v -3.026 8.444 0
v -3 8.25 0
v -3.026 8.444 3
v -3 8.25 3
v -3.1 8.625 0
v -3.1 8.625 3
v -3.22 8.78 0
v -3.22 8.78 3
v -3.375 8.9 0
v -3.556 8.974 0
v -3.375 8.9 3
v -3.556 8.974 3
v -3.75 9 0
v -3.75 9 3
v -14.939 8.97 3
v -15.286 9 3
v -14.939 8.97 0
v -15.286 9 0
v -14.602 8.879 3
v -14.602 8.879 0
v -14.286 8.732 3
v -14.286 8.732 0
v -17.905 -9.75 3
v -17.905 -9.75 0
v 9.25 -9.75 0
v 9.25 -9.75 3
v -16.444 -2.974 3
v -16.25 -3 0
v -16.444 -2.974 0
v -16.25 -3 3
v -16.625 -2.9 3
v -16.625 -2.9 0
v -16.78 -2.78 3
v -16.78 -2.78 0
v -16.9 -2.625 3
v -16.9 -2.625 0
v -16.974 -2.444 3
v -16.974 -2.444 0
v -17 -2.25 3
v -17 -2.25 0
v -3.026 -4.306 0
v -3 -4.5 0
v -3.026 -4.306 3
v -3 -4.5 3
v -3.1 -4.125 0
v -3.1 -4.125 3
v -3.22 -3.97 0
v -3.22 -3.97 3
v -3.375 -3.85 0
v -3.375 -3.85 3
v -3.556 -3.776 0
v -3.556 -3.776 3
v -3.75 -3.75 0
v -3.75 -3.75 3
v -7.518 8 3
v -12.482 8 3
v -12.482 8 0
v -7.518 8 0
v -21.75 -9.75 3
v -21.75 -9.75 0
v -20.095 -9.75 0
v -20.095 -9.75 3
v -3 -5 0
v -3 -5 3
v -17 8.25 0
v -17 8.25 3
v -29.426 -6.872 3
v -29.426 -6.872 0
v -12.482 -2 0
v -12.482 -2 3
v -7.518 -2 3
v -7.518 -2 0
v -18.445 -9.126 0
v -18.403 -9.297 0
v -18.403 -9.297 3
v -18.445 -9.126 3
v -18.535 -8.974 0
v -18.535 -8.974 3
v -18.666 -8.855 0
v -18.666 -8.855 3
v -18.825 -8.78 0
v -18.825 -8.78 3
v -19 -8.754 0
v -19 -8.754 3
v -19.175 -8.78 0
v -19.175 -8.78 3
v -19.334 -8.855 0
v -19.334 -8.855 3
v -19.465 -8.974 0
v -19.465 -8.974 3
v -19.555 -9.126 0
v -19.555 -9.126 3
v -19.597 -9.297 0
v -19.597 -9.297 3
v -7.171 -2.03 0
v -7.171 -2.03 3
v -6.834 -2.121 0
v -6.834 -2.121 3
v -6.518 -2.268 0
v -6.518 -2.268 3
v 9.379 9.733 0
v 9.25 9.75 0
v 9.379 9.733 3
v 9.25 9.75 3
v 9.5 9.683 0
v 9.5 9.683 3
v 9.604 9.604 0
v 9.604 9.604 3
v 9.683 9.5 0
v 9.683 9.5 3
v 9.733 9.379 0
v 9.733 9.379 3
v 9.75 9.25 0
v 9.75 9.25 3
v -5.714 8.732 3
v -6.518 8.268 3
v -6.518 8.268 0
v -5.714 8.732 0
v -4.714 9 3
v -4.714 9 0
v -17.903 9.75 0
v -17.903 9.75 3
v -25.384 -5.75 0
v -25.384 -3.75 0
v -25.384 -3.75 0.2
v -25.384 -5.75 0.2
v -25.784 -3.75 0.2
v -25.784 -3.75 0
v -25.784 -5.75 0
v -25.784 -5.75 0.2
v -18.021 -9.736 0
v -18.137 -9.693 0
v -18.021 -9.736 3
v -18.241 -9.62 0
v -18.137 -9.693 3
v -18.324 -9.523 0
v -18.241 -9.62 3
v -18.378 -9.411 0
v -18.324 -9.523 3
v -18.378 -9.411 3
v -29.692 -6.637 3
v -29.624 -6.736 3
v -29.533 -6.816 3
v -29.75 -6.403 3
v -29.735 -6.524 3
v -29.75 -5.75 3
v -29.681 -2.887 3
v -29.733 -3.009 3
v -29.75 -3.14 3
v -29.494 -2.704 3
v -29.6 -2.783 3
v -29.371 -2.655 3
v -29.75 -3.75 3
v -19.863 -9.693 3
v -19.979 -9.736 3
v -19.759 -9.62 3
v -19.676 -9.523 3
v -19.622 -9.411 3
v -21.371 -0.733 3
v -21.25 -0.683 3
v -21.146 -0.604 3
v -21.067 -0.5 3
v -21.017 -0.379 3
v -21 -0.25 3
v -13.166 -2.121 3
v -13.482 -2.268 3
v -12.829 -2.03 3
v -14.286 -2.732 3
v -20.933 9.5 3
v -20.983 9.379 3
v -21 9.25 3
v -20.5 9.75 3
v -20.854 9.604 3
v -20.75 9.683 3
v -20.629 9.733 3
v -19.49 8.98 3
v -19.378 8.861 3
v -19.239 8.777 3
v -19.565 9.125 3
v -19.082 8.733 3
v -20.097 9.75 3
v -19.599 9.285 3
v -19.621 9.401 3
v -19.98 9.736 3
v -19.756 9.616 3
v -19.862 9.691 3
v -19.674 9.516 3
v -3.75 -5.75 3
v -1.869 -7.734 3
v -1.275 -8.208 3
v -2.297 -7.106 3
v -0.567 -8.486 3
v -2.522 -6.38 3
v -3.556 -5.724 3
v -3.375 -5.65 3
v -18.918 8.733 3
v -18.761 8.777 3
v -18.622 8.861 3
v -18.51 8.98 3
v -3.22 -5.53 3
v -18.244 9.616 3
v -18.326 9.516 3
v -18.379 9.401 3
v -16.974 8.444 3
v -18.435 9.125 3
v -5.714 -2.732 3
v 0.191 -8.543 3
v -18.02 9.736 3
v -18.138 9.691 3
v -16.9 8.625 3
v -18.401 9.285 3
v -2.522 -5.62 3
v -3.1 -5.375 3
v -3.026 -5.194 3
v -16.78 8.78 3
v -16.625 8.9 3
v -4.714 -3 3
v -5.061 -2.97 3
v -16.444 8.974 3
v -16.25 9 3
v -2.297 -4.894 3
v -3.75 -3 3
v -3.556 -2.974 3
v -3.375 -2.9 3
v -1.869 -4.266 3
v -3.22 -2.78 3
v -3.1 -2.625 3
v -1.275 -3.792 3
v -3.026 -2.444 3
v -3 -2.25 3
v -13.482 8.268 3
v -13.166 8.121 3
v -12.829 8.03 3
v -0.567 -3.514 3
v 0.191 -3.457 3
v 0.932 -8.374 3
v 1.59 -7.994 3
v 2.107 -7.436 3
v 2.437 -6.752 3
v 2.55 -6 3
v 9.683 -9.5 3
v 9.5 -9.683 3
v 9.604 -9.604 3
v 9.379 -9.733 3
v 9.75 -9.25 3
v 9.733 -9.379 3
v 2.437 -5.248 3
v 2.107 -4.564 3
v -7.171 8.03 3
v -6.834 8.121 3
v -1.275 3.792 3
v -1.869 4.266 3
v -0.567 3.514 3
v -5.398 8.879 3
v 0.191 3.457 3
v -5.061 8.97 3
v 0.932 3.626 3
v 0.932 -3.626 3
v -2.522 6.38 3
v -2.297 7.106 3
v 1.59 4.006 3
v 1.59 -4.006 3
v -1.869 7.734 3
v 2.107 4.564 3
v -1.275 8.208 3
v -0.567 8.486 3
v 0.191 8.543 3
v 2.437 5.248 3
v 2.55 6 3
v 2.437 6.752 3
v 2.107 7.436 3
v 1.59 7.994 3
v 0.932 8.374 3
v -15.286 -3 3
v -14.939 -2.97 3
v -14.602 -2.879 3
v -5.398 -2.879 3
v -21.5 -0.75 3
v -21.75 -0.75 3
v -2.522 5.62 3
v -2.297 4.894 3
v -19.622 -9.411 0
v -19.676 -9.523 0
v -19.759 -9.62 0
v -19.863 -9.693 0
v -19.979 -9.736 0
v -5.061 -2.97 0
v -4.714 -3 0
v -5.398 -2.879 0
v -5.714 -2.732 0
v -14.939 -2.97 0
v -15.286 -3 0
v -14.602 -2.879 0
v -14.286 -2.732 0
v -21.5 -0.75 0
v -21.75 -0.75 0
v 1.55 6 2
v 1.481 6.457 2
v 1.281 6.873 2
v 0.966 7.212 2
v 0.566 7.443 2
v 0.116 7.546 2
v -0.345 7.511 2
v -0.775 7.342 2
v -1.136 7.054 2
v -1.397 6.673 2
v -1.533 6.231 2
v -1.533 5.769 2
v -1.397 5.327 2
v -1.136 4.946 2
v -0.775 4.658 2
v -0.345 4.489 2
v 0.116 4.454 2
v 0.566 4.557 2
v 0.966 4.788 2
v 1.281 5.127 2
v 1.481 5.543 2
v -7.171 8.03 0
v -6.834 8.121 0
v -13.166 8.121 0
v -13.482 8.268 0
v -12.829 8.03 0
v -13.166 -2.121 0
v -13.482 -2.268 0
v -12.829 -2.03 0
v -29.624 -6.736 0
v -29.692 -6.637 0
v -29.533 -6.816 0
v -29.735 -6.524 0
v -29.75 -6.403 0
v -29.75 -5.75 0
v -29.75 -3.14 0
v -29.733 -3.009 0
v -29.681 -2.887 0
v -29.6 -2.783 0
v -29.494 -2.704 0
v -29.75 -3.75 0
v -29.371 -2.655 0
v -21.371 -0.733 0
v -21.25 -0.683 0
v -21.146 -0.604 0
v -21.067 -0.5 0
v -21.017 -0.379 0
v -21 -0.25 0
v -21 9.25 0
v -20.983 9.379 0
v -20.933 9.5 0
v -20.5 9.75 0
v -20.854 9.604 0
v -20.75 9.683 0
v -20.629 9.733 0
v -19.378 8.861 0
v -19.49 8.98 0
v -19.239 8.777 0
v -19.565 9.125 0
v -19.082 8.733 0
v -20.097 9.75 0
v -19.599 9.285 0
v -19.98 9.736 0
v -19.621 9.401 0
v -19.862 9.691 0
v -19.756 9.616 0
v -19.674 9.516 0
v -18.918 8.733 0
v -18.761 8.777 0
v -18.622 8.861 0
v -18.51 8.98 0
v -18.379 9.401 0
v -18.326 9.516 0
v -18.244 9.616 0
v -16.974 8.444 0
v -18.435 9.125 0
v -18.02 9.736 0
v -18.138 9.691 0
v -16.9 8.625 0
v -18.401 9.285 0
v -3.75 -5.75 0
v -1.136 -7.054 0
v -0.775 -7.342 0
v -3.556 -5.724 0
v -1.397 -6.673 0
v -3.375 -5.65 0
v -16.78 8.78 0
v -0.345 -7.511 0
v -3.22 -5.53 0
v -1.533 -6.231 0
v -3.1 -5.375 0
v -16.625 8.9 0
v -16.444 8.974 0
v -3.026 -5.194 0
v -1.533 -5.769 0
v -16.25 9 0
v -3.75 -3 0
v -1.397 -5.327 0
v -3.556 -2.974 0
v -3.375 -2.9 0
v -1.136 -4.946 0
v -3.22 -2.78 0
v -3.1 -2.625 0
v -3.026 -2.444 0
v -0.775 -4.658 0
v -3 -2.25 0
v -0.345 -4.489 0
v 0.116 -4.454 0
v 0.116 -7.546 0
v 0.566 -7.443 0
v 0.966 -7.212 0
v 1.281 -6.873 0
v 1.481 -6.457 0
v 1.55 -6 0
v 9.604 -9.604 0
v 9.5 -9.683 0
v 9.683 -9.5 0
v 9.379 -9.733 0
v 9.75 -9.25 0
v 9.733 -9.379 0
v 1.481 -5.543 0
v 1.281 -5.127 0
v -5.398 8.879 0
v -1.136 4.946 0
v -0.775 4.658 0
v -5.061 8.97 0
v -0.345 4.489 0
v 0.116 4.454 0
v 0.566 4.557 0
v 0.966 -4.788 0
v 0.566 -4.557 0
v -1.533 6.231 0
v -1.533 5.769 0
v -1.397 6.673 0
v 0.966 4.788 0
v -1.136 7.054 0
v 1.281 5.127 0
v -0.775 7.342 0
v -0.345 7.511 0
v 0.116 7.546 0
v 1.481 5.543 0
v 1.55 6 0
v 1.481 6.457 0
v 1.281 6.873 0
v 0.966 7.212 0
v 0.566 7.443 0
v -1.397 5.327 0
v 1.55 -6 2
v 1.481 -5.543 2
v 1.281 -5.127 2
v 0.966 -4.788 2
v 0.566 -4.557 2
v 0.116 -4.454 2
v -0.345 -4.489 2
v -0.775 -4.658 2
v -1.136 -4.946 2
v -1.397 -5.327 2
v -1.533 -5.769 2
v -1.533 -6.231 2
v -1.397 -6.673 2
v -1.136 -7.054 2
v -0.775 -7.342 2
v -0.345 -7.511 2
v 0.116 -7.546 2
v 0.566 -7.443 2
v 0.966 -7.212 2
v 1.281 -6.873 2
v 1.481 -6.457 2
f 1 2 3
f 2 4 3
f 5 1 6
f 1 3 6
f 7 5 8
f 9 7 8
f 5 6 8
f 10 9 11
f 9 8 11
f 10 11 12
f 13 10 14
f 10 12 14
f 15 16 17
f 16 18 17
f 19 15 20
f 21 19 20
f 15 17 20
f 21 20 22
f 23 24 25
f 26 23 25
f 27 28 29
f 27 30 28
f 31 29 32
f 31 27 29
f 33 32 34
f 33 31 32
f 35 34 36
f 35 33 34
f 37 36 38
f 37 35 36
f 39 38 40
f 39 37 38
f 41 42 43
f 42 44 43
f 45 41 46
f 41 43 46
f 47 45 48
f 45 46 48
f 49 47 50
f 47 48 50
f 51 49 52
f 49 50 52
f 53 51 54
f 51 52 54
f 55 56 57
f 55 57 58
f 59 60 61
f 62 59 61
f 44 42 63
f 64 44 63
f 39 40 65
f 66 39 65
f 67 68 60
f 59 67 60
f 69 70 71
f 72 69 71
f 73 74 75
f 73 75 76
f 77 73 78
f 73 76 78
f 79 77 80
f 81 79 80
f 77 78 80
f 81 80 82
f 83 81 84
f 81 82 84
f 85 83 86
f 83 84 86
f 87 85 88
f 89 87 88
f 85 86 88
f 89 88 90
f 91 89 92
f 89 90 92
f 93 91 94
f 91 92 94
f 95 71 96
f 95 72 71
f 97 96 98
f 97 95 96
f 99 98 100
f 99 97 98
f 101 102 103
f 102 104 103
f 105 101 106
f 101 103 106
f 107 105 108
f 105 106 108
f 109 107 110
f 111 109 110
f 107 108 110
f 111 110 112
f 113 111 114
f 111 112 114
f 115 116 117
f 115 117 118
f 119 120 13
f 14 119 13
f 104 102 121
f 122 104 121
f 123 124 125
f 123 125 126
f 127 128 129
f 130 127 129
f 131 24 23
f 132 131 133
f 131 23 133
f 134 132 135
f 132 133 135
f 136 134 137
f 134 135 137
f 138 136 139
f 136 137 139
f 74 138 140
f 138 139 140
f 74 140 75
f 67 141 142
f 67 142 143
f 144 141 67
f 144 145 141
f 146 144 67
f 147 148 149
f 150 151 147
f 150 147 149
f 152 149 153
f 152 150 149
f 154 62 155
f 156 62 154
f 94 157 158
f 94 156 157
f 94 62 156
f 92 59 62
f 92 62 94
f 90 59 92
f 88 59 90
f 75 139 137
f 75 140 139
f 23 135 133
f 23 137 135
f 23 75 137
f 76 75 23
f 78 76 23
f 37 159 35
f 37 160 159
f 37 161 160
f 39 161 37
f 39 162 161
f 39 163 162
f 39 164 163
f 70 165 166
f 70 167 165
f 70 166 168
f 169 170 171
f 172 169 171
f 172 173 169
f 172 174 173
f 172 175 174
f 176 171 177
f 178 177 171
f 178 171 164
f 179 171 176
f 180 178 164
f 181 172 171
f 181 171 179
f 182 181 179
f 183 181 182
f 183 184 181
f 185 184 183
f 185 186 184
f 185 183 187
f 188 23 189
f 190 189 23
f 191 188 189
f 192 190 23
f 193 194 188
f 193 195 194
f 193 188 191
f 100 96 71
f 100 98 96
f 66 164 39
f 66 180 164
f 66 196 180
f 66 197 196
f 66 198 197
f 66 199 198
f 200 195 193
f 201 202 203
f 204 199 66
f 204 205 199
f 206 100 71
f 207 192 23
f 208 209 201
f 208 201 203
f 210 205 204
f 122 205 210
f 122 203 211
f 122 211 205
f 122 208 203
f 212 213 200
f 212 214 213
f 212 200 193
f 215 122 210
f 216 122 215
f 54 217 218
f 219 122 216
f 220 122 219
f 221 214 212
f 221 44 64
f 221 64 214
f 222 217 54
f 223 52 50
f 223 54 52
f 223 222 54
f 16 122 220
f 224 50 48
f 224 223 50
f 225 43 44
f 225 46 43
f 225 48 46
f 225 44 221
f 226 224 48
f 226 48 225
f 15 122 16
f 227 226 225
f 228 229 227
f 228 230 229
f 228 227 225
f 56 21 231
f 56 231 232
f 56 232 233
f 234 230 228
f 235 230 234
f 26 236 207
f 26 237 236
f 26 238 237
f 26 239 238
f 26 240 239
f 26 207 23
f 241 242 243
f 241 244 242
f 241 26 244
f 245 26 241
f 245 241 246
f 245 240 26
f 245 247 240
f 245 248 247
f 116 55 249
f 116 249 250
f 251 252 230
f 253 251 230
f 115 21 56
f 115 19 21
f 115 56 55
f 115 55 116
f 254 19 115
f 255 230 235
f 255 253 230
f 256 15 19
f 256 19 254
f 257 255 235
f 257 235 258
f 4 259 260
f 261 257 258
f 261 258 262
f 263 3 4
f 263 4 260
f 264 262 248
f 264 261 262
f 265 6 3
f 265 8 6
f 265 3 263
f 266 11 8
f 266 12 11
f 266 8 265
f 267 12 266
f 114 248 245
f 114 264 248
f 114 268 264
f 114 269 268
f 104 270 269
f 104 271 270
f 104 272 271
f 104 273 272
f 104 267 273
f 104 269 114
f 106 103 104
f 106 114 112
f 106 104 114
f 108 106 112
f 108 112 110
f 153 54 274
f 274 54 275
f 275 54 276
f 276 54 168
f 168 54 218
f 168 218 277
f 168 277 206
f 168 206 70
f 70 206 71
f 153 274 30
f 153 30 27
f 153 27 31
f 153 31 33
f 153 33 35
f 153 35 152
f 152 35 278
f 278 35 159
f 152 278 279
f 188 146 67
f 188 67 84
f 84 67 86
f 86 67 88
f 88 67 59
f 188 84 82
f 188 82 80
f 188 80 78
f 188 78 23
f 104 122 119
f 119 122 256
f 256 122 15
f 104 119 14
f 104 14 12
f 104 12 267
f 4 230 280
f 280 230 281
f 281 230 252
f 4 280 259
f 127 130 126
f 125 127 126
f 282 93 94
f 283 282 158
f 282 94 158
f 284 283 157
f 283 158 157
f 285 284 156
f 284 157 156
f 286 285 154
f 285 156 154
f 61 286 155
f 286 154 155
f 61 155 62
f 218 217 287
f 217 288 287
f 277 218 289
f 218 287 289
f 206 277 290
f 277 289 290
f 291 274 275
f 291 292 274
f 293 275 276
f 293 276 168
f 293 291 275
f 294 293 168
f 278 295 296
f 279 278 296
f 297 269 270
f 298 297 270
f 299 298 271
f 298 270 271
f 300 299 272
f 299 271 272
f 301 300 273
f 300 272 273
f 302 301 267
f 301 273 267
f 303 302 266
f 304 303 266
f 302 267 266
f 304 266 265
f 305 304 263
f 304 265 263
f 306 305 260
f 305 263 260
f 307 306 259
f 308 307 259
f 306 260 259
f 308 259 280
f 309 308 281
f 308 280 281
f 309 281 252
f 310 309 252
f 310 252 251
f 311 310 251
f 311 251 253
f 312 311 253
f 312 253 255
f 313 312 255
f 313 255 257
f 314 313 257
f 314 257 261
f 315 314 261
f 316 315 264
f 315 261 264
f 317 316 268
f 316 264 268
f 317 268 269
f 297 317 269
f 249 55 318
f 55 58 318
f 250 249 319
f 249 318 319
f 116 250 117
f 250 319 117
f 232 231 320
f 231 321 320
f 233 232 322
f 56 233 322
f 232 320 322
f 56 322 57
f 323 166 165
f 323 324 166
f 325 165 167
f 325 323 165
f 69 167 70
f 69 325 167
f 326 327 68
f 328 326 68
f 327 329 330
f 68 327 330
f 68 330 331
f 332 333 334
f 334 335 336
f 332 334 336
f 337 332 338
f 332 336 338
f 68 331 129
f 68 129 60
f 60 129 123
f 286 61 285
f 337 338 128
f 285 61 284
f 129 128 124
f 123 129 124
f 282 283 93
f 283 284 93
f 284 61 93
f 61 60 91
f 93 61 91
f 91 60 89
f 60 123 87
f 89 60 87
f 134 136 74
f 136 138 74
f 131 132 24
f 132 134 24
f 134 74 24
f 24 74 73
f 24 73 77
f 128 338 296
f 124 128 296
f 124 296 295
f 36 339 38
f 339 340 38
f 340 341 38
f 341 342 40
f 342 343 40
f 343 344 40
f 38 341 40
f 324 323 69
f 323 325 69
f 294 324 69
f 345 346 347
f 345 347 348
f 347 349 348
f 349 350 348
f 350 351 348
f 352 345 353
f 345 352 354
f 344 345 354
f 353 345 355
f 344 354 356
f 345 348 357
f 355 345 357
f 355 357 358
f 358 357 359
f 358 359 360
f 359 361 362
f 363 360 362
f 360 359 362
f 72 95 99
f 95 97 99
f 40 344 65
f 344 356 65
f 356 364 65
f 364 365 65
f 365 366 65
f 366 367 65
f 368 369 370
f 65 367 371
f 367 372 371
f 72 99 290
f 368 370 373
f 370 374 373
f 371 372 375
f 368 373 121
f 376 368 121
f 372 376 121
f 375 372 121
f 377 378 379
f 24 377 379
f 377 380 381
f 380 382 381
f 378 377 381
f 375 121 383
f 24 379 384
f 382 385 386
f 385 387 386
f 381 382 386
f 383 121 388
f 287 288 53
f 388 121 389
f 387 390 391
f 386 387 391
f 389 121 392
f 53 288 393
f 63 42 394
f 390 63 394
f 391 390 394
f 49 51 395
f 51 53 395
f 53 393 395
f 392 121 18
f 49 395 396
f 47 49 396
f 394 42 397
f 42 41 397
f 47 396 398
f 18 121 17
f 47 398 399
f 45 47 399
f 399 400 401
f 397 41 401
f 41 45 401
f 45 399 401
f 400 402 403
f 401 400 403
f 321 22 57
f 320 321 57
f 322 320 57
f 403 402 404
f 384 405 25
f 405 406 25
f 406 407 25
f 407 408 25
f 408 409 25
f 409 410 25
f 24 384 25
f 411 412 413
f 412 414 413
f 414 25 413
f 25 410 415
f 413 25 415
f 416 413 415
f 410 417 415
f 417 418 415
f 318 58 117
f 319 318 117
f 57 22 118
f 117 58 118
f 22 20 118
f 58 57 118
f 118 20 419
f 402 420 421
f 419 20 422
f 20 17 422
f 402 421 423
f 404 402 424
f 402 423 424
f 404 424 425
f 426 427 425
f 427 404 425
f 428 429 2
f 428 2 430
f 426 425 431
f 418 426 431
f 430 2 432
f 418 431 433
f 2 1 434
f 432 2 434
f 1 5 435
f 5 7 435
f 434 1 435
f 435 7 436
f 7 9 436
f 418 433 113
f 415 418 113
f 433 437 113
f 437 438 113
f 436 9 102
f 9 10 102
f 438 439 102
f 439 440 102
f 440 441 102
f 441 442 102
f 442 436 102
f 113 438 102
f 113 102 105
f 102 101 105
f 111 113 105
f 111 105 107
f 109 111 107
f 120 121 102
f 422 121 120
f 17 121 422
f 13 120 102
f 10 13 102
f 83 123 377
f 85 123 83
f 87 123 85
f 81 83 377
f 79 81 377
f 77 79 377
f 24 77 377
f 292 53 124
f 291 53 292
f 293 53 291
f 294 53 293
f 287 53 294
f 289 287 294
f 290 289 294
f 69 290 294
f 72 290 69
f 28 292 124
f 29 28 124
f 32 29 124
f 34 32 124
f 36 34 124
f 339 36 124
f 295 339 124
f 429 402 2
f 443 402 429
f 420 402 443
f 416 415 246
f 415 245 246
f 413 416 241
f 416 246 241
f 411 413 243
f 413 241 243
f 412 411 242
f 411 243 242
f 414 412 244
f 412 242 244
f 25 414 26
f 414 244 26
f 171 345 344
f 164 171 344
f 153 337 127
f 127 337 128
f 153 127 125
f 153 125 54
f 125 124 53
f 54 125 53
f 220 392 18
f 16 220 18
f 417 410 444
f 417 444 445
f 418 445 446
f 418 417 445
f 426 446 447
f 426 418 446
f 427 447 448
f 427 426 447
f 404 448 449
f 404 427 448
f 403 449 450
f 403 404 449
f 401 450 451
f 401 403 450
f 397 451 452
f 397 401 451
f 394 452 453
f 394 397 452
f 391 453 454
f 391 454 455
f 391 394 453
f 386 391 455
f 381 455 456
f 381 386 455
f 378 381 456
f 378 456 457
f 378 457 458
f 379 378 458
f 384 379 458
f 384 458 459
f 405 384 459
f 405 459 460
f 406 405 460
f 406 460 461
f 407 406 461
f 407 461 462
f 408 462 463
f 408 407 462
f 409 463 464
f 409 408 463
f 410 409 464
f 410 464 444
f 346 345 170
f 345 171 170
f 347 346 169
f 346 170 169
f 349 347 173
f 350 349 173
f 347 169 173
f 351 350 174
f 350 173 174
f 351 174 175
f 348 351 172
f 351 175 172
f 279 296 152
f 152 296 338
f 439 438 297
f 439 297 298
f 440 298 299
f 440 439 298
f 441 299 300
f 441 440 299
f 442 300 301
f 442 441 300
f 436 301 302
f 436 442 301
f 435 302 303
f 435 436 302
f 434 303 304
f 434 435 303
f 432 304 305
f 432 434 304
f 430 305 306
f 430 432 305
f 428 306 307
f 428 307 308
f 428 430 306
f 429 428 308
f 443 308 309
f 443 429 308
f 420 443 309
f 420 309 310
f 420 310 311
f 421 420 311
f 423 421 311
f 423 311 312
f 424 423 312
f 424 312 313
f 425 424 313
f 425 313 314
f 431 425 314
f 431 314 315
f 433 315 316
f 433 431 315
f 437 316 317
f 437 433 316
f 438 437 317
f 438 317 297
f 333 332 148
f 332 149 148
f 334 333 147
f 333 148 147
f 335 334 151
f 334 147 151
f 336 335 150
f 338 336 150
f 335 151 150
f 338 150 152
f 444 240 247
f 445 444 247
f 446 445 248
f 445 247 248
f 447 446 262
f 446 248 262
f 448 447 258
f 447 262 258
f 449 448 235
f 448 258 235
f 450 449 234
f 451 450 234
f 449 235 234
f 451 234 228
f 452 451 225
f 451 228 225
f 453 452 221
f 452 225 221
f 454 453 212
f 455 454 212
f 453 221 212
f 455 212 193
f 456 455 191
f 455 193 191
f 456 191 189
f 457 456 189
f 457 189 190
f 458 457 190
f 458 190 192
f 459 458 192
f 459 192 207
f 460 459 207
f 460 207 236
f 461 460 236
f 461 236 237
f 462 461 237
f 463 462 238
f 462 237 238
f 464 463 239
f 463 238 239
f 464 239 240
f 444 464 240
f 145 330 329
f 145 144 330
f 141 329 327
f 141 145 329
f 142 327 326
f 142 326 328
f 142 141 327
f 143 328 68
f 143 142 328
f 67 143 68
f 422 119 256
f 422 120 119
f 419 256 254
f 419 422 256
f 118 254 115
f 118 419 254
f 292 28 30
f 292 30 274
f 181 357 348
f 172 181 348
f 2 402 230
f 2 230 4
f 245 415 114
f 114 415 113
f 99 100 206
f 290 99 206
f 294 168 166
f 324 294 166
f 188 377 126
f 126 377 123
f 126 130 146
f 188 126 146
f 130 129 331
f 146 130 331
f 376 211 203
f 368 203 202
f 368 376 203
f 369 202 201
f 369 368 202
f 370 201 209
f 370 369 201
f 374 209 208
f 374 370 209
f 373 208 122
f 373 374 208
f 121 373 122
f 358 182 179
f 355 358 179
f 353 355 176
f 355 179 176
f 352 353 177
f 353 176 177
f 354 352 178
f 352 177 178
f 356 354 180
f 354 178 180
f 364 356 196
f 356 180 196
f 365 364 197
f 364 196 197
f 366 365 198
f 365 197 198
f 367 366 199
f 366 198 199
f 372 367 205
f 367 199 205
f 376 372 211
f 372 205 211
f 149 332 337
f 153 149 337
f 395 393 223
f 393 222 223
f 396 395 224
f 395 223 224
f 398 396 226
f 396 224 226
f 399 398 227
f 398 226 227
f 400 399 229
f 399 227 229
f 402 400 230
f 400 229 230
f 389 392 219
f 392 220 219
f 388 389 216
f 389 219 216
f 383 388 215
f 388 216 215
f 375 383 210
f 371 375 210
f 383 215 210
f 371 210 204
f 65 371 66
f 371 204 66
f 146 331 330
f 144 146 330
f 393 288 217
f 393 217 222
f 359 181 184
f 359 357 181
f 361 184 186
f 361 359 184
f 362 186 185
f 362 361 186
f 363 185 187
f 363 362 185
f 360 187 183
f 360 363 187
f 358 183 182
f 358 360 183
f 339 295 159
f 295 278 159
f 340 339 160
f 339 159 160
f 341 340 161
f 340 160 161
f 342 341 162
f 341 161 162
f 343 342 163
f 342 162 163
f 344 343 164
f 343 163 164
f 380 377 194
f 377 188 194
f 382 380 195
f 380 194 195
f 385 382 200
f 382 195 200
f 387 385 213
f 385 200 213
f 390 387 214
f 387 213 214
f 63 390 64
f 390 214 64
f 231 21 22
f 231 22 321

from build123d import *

# Parameters (mm, degrees)
SKETCH_R     = 1.55
SKETCH_W     = 14
SKETCH_H     = 12
PAD_DEPTH    = 3
FILLET_R     = 0.75
POCKET_DEPTH = 5
FILLET001_R  = 0.5
CHAMFER_SIZE = 1
PAD001_DEPTH = 3
FILLET002_R  = 2
SKETCH004_W  = 0.400118
SKETCH004_H  = 2.725121
PAD002_DEPTH = 0.2


with BuildPart() as part:
    # Sketch → Pad (new body)
    with BuildSketch(Plane.XY):
        Polygon((-9.75, -9.75), (9.75, -9.75), (9.75, 9.75), (-9.75, 9.75), (-21, 9.75), (-21, -0.75), (-21.75, -0.75), (-29.75, -2.75), (-29.75, -3.75), (-3, -3.75), (-3, -5.75), (-29.75, -5.75), (-29.75, -6.75), (-21.75, -9.75), align=None)
        with Locations((0, 6)):
            Circle(SKETCH_R, mode=Mode.SUBTRACT)
        with Locations((0, -6)):
            Circle(SKETCH_R, mode=Mode.SUBTRACT)
        with Locations((-10, 3)):
            Rectangle(SKETCH_W, SKETCH_H, mode=Mode.SUBTRACT)
    extrude(amount=PAD_DEPTH)

    # Fillet
    fillet_edges = [part.edges().sort_by_distance(p)[0] for p in [
        (-3, -3, 1.5),
        (-3, 9, 1.5),
        (-17, 9, 1.5),
        (-17, -3, 1.5),
        (-3, -3.75, 1.5),
        (-3, -5.75, 1.5),
    ]]
    fillet(fillet_edges, radius=FILLET_R)

    # Sketch002 (on Face26 of Fillet) → Pocket (cut)
    with BuildSketch(Plane.XY.offset(3)):
        with BuildLine():
            ThreePointArc((-18.4, -9.353833), (-19, -8.753833), (-19.6, -9.353833))
            Line((-19.6, -9.353833), (-19.6, -11.103725))
            ThreePointArc((-19.6, -11.103725), (-19, -11.703725), (-18.4, -11.103725))
            Line((-18.4, -9.353833), (-18.4, -11.103725))
        make_face()
        with BuildLine():
            ThreePointArc((-18.4, 12.382466), (-19, 12.982466), (-19.6, 12.382466))
            Line((-19.6, 12.382466), (-19.6, 9.326973))
            ThreePointArc((-19.6, 9.326973), (-19, 8.726973), (-18.4, 9.326973))
            Line((-18.4, 12.382466), (-18.4, 9.326973))
        make_face()
    extrude(amount=-POCKET_DEPTH, mode=Mode.SUBTRACT)

    # Fillet001
    fillet001_edges = [part.edges().sort_by_distance(p)[0] for p in [
        (-21, 9.75, 1.5),
        (-21, -0.75, 1.5),
        (9.75, -9.75, 1.5),
        (9.75, 9.75, 1.5),
        (-19.6, 9.75, 1.5),
        (-18.4, 9.75, 1.5),
        (-19.6, -9.75, 1.5),
        (-18.4, -9.75, 1.5),
        (-29.75, -6.75, 1.5),
        (-29.75, -2.75, 1.5),
    ]]
    fillet(fillet001_edges, radius=FILLET001_R)

    # Chamfer
    chamfer_edges = [part.edges().sort_by_distance(p)[0] for p in [
        (-1.55, 6, 3),
        (-1.55, -6, 3),
    ]]
    chamfer(chamfer_edges, length=CHAMFER_SIZE)

    # Sketch003 (on Face4 of Chamfer) → Pad001 (join)
    with BuildSketch(Plane.XY.offset(3)):
        Polygon((-14.75, 9), (-13.017949, 8), (-6.982051, 8), (-5.25, 9), align=None)
        Polygon((-14.75, -3), (-13.017949, -2), (-6.982051, -2), (-5.25, -3), align=None)
    extrude(amount=-PAD001_DEPTH)

    # Fillet002
    fillet002_edges = [part.edges().sort_by_distance(p)[0] for p in [
        (-5.25, -3, 1.5),
        (-14.75, -3, 1.5),
        (-13.017949, -2, 1.5),
        (-6.982051, -2, 1.5),
        (-5.25, 9, 1.5),
        (-6.982051, 8, 1.5),
        (-13.017949, 8, 1.5),
        (-14.75, 9, 1.5),
    ]]
    fillet(fillet002_edges, radius=FILLET002_R)

    # Sketch004 (on Face1 of Fillet002) → Pad002 (join)
    with BuildSketch(Plane(origin=(0, 0, 0), x_dir=(1, 0, 0), z_dir=(0, 0, -1))):
        with Locations((-25.583762, 4.610938)):
            Rectangle(SKETCH004_W, SKETCH004_H)
    extrude(amount=-PAD002_DEPTH)


solid = part.part
